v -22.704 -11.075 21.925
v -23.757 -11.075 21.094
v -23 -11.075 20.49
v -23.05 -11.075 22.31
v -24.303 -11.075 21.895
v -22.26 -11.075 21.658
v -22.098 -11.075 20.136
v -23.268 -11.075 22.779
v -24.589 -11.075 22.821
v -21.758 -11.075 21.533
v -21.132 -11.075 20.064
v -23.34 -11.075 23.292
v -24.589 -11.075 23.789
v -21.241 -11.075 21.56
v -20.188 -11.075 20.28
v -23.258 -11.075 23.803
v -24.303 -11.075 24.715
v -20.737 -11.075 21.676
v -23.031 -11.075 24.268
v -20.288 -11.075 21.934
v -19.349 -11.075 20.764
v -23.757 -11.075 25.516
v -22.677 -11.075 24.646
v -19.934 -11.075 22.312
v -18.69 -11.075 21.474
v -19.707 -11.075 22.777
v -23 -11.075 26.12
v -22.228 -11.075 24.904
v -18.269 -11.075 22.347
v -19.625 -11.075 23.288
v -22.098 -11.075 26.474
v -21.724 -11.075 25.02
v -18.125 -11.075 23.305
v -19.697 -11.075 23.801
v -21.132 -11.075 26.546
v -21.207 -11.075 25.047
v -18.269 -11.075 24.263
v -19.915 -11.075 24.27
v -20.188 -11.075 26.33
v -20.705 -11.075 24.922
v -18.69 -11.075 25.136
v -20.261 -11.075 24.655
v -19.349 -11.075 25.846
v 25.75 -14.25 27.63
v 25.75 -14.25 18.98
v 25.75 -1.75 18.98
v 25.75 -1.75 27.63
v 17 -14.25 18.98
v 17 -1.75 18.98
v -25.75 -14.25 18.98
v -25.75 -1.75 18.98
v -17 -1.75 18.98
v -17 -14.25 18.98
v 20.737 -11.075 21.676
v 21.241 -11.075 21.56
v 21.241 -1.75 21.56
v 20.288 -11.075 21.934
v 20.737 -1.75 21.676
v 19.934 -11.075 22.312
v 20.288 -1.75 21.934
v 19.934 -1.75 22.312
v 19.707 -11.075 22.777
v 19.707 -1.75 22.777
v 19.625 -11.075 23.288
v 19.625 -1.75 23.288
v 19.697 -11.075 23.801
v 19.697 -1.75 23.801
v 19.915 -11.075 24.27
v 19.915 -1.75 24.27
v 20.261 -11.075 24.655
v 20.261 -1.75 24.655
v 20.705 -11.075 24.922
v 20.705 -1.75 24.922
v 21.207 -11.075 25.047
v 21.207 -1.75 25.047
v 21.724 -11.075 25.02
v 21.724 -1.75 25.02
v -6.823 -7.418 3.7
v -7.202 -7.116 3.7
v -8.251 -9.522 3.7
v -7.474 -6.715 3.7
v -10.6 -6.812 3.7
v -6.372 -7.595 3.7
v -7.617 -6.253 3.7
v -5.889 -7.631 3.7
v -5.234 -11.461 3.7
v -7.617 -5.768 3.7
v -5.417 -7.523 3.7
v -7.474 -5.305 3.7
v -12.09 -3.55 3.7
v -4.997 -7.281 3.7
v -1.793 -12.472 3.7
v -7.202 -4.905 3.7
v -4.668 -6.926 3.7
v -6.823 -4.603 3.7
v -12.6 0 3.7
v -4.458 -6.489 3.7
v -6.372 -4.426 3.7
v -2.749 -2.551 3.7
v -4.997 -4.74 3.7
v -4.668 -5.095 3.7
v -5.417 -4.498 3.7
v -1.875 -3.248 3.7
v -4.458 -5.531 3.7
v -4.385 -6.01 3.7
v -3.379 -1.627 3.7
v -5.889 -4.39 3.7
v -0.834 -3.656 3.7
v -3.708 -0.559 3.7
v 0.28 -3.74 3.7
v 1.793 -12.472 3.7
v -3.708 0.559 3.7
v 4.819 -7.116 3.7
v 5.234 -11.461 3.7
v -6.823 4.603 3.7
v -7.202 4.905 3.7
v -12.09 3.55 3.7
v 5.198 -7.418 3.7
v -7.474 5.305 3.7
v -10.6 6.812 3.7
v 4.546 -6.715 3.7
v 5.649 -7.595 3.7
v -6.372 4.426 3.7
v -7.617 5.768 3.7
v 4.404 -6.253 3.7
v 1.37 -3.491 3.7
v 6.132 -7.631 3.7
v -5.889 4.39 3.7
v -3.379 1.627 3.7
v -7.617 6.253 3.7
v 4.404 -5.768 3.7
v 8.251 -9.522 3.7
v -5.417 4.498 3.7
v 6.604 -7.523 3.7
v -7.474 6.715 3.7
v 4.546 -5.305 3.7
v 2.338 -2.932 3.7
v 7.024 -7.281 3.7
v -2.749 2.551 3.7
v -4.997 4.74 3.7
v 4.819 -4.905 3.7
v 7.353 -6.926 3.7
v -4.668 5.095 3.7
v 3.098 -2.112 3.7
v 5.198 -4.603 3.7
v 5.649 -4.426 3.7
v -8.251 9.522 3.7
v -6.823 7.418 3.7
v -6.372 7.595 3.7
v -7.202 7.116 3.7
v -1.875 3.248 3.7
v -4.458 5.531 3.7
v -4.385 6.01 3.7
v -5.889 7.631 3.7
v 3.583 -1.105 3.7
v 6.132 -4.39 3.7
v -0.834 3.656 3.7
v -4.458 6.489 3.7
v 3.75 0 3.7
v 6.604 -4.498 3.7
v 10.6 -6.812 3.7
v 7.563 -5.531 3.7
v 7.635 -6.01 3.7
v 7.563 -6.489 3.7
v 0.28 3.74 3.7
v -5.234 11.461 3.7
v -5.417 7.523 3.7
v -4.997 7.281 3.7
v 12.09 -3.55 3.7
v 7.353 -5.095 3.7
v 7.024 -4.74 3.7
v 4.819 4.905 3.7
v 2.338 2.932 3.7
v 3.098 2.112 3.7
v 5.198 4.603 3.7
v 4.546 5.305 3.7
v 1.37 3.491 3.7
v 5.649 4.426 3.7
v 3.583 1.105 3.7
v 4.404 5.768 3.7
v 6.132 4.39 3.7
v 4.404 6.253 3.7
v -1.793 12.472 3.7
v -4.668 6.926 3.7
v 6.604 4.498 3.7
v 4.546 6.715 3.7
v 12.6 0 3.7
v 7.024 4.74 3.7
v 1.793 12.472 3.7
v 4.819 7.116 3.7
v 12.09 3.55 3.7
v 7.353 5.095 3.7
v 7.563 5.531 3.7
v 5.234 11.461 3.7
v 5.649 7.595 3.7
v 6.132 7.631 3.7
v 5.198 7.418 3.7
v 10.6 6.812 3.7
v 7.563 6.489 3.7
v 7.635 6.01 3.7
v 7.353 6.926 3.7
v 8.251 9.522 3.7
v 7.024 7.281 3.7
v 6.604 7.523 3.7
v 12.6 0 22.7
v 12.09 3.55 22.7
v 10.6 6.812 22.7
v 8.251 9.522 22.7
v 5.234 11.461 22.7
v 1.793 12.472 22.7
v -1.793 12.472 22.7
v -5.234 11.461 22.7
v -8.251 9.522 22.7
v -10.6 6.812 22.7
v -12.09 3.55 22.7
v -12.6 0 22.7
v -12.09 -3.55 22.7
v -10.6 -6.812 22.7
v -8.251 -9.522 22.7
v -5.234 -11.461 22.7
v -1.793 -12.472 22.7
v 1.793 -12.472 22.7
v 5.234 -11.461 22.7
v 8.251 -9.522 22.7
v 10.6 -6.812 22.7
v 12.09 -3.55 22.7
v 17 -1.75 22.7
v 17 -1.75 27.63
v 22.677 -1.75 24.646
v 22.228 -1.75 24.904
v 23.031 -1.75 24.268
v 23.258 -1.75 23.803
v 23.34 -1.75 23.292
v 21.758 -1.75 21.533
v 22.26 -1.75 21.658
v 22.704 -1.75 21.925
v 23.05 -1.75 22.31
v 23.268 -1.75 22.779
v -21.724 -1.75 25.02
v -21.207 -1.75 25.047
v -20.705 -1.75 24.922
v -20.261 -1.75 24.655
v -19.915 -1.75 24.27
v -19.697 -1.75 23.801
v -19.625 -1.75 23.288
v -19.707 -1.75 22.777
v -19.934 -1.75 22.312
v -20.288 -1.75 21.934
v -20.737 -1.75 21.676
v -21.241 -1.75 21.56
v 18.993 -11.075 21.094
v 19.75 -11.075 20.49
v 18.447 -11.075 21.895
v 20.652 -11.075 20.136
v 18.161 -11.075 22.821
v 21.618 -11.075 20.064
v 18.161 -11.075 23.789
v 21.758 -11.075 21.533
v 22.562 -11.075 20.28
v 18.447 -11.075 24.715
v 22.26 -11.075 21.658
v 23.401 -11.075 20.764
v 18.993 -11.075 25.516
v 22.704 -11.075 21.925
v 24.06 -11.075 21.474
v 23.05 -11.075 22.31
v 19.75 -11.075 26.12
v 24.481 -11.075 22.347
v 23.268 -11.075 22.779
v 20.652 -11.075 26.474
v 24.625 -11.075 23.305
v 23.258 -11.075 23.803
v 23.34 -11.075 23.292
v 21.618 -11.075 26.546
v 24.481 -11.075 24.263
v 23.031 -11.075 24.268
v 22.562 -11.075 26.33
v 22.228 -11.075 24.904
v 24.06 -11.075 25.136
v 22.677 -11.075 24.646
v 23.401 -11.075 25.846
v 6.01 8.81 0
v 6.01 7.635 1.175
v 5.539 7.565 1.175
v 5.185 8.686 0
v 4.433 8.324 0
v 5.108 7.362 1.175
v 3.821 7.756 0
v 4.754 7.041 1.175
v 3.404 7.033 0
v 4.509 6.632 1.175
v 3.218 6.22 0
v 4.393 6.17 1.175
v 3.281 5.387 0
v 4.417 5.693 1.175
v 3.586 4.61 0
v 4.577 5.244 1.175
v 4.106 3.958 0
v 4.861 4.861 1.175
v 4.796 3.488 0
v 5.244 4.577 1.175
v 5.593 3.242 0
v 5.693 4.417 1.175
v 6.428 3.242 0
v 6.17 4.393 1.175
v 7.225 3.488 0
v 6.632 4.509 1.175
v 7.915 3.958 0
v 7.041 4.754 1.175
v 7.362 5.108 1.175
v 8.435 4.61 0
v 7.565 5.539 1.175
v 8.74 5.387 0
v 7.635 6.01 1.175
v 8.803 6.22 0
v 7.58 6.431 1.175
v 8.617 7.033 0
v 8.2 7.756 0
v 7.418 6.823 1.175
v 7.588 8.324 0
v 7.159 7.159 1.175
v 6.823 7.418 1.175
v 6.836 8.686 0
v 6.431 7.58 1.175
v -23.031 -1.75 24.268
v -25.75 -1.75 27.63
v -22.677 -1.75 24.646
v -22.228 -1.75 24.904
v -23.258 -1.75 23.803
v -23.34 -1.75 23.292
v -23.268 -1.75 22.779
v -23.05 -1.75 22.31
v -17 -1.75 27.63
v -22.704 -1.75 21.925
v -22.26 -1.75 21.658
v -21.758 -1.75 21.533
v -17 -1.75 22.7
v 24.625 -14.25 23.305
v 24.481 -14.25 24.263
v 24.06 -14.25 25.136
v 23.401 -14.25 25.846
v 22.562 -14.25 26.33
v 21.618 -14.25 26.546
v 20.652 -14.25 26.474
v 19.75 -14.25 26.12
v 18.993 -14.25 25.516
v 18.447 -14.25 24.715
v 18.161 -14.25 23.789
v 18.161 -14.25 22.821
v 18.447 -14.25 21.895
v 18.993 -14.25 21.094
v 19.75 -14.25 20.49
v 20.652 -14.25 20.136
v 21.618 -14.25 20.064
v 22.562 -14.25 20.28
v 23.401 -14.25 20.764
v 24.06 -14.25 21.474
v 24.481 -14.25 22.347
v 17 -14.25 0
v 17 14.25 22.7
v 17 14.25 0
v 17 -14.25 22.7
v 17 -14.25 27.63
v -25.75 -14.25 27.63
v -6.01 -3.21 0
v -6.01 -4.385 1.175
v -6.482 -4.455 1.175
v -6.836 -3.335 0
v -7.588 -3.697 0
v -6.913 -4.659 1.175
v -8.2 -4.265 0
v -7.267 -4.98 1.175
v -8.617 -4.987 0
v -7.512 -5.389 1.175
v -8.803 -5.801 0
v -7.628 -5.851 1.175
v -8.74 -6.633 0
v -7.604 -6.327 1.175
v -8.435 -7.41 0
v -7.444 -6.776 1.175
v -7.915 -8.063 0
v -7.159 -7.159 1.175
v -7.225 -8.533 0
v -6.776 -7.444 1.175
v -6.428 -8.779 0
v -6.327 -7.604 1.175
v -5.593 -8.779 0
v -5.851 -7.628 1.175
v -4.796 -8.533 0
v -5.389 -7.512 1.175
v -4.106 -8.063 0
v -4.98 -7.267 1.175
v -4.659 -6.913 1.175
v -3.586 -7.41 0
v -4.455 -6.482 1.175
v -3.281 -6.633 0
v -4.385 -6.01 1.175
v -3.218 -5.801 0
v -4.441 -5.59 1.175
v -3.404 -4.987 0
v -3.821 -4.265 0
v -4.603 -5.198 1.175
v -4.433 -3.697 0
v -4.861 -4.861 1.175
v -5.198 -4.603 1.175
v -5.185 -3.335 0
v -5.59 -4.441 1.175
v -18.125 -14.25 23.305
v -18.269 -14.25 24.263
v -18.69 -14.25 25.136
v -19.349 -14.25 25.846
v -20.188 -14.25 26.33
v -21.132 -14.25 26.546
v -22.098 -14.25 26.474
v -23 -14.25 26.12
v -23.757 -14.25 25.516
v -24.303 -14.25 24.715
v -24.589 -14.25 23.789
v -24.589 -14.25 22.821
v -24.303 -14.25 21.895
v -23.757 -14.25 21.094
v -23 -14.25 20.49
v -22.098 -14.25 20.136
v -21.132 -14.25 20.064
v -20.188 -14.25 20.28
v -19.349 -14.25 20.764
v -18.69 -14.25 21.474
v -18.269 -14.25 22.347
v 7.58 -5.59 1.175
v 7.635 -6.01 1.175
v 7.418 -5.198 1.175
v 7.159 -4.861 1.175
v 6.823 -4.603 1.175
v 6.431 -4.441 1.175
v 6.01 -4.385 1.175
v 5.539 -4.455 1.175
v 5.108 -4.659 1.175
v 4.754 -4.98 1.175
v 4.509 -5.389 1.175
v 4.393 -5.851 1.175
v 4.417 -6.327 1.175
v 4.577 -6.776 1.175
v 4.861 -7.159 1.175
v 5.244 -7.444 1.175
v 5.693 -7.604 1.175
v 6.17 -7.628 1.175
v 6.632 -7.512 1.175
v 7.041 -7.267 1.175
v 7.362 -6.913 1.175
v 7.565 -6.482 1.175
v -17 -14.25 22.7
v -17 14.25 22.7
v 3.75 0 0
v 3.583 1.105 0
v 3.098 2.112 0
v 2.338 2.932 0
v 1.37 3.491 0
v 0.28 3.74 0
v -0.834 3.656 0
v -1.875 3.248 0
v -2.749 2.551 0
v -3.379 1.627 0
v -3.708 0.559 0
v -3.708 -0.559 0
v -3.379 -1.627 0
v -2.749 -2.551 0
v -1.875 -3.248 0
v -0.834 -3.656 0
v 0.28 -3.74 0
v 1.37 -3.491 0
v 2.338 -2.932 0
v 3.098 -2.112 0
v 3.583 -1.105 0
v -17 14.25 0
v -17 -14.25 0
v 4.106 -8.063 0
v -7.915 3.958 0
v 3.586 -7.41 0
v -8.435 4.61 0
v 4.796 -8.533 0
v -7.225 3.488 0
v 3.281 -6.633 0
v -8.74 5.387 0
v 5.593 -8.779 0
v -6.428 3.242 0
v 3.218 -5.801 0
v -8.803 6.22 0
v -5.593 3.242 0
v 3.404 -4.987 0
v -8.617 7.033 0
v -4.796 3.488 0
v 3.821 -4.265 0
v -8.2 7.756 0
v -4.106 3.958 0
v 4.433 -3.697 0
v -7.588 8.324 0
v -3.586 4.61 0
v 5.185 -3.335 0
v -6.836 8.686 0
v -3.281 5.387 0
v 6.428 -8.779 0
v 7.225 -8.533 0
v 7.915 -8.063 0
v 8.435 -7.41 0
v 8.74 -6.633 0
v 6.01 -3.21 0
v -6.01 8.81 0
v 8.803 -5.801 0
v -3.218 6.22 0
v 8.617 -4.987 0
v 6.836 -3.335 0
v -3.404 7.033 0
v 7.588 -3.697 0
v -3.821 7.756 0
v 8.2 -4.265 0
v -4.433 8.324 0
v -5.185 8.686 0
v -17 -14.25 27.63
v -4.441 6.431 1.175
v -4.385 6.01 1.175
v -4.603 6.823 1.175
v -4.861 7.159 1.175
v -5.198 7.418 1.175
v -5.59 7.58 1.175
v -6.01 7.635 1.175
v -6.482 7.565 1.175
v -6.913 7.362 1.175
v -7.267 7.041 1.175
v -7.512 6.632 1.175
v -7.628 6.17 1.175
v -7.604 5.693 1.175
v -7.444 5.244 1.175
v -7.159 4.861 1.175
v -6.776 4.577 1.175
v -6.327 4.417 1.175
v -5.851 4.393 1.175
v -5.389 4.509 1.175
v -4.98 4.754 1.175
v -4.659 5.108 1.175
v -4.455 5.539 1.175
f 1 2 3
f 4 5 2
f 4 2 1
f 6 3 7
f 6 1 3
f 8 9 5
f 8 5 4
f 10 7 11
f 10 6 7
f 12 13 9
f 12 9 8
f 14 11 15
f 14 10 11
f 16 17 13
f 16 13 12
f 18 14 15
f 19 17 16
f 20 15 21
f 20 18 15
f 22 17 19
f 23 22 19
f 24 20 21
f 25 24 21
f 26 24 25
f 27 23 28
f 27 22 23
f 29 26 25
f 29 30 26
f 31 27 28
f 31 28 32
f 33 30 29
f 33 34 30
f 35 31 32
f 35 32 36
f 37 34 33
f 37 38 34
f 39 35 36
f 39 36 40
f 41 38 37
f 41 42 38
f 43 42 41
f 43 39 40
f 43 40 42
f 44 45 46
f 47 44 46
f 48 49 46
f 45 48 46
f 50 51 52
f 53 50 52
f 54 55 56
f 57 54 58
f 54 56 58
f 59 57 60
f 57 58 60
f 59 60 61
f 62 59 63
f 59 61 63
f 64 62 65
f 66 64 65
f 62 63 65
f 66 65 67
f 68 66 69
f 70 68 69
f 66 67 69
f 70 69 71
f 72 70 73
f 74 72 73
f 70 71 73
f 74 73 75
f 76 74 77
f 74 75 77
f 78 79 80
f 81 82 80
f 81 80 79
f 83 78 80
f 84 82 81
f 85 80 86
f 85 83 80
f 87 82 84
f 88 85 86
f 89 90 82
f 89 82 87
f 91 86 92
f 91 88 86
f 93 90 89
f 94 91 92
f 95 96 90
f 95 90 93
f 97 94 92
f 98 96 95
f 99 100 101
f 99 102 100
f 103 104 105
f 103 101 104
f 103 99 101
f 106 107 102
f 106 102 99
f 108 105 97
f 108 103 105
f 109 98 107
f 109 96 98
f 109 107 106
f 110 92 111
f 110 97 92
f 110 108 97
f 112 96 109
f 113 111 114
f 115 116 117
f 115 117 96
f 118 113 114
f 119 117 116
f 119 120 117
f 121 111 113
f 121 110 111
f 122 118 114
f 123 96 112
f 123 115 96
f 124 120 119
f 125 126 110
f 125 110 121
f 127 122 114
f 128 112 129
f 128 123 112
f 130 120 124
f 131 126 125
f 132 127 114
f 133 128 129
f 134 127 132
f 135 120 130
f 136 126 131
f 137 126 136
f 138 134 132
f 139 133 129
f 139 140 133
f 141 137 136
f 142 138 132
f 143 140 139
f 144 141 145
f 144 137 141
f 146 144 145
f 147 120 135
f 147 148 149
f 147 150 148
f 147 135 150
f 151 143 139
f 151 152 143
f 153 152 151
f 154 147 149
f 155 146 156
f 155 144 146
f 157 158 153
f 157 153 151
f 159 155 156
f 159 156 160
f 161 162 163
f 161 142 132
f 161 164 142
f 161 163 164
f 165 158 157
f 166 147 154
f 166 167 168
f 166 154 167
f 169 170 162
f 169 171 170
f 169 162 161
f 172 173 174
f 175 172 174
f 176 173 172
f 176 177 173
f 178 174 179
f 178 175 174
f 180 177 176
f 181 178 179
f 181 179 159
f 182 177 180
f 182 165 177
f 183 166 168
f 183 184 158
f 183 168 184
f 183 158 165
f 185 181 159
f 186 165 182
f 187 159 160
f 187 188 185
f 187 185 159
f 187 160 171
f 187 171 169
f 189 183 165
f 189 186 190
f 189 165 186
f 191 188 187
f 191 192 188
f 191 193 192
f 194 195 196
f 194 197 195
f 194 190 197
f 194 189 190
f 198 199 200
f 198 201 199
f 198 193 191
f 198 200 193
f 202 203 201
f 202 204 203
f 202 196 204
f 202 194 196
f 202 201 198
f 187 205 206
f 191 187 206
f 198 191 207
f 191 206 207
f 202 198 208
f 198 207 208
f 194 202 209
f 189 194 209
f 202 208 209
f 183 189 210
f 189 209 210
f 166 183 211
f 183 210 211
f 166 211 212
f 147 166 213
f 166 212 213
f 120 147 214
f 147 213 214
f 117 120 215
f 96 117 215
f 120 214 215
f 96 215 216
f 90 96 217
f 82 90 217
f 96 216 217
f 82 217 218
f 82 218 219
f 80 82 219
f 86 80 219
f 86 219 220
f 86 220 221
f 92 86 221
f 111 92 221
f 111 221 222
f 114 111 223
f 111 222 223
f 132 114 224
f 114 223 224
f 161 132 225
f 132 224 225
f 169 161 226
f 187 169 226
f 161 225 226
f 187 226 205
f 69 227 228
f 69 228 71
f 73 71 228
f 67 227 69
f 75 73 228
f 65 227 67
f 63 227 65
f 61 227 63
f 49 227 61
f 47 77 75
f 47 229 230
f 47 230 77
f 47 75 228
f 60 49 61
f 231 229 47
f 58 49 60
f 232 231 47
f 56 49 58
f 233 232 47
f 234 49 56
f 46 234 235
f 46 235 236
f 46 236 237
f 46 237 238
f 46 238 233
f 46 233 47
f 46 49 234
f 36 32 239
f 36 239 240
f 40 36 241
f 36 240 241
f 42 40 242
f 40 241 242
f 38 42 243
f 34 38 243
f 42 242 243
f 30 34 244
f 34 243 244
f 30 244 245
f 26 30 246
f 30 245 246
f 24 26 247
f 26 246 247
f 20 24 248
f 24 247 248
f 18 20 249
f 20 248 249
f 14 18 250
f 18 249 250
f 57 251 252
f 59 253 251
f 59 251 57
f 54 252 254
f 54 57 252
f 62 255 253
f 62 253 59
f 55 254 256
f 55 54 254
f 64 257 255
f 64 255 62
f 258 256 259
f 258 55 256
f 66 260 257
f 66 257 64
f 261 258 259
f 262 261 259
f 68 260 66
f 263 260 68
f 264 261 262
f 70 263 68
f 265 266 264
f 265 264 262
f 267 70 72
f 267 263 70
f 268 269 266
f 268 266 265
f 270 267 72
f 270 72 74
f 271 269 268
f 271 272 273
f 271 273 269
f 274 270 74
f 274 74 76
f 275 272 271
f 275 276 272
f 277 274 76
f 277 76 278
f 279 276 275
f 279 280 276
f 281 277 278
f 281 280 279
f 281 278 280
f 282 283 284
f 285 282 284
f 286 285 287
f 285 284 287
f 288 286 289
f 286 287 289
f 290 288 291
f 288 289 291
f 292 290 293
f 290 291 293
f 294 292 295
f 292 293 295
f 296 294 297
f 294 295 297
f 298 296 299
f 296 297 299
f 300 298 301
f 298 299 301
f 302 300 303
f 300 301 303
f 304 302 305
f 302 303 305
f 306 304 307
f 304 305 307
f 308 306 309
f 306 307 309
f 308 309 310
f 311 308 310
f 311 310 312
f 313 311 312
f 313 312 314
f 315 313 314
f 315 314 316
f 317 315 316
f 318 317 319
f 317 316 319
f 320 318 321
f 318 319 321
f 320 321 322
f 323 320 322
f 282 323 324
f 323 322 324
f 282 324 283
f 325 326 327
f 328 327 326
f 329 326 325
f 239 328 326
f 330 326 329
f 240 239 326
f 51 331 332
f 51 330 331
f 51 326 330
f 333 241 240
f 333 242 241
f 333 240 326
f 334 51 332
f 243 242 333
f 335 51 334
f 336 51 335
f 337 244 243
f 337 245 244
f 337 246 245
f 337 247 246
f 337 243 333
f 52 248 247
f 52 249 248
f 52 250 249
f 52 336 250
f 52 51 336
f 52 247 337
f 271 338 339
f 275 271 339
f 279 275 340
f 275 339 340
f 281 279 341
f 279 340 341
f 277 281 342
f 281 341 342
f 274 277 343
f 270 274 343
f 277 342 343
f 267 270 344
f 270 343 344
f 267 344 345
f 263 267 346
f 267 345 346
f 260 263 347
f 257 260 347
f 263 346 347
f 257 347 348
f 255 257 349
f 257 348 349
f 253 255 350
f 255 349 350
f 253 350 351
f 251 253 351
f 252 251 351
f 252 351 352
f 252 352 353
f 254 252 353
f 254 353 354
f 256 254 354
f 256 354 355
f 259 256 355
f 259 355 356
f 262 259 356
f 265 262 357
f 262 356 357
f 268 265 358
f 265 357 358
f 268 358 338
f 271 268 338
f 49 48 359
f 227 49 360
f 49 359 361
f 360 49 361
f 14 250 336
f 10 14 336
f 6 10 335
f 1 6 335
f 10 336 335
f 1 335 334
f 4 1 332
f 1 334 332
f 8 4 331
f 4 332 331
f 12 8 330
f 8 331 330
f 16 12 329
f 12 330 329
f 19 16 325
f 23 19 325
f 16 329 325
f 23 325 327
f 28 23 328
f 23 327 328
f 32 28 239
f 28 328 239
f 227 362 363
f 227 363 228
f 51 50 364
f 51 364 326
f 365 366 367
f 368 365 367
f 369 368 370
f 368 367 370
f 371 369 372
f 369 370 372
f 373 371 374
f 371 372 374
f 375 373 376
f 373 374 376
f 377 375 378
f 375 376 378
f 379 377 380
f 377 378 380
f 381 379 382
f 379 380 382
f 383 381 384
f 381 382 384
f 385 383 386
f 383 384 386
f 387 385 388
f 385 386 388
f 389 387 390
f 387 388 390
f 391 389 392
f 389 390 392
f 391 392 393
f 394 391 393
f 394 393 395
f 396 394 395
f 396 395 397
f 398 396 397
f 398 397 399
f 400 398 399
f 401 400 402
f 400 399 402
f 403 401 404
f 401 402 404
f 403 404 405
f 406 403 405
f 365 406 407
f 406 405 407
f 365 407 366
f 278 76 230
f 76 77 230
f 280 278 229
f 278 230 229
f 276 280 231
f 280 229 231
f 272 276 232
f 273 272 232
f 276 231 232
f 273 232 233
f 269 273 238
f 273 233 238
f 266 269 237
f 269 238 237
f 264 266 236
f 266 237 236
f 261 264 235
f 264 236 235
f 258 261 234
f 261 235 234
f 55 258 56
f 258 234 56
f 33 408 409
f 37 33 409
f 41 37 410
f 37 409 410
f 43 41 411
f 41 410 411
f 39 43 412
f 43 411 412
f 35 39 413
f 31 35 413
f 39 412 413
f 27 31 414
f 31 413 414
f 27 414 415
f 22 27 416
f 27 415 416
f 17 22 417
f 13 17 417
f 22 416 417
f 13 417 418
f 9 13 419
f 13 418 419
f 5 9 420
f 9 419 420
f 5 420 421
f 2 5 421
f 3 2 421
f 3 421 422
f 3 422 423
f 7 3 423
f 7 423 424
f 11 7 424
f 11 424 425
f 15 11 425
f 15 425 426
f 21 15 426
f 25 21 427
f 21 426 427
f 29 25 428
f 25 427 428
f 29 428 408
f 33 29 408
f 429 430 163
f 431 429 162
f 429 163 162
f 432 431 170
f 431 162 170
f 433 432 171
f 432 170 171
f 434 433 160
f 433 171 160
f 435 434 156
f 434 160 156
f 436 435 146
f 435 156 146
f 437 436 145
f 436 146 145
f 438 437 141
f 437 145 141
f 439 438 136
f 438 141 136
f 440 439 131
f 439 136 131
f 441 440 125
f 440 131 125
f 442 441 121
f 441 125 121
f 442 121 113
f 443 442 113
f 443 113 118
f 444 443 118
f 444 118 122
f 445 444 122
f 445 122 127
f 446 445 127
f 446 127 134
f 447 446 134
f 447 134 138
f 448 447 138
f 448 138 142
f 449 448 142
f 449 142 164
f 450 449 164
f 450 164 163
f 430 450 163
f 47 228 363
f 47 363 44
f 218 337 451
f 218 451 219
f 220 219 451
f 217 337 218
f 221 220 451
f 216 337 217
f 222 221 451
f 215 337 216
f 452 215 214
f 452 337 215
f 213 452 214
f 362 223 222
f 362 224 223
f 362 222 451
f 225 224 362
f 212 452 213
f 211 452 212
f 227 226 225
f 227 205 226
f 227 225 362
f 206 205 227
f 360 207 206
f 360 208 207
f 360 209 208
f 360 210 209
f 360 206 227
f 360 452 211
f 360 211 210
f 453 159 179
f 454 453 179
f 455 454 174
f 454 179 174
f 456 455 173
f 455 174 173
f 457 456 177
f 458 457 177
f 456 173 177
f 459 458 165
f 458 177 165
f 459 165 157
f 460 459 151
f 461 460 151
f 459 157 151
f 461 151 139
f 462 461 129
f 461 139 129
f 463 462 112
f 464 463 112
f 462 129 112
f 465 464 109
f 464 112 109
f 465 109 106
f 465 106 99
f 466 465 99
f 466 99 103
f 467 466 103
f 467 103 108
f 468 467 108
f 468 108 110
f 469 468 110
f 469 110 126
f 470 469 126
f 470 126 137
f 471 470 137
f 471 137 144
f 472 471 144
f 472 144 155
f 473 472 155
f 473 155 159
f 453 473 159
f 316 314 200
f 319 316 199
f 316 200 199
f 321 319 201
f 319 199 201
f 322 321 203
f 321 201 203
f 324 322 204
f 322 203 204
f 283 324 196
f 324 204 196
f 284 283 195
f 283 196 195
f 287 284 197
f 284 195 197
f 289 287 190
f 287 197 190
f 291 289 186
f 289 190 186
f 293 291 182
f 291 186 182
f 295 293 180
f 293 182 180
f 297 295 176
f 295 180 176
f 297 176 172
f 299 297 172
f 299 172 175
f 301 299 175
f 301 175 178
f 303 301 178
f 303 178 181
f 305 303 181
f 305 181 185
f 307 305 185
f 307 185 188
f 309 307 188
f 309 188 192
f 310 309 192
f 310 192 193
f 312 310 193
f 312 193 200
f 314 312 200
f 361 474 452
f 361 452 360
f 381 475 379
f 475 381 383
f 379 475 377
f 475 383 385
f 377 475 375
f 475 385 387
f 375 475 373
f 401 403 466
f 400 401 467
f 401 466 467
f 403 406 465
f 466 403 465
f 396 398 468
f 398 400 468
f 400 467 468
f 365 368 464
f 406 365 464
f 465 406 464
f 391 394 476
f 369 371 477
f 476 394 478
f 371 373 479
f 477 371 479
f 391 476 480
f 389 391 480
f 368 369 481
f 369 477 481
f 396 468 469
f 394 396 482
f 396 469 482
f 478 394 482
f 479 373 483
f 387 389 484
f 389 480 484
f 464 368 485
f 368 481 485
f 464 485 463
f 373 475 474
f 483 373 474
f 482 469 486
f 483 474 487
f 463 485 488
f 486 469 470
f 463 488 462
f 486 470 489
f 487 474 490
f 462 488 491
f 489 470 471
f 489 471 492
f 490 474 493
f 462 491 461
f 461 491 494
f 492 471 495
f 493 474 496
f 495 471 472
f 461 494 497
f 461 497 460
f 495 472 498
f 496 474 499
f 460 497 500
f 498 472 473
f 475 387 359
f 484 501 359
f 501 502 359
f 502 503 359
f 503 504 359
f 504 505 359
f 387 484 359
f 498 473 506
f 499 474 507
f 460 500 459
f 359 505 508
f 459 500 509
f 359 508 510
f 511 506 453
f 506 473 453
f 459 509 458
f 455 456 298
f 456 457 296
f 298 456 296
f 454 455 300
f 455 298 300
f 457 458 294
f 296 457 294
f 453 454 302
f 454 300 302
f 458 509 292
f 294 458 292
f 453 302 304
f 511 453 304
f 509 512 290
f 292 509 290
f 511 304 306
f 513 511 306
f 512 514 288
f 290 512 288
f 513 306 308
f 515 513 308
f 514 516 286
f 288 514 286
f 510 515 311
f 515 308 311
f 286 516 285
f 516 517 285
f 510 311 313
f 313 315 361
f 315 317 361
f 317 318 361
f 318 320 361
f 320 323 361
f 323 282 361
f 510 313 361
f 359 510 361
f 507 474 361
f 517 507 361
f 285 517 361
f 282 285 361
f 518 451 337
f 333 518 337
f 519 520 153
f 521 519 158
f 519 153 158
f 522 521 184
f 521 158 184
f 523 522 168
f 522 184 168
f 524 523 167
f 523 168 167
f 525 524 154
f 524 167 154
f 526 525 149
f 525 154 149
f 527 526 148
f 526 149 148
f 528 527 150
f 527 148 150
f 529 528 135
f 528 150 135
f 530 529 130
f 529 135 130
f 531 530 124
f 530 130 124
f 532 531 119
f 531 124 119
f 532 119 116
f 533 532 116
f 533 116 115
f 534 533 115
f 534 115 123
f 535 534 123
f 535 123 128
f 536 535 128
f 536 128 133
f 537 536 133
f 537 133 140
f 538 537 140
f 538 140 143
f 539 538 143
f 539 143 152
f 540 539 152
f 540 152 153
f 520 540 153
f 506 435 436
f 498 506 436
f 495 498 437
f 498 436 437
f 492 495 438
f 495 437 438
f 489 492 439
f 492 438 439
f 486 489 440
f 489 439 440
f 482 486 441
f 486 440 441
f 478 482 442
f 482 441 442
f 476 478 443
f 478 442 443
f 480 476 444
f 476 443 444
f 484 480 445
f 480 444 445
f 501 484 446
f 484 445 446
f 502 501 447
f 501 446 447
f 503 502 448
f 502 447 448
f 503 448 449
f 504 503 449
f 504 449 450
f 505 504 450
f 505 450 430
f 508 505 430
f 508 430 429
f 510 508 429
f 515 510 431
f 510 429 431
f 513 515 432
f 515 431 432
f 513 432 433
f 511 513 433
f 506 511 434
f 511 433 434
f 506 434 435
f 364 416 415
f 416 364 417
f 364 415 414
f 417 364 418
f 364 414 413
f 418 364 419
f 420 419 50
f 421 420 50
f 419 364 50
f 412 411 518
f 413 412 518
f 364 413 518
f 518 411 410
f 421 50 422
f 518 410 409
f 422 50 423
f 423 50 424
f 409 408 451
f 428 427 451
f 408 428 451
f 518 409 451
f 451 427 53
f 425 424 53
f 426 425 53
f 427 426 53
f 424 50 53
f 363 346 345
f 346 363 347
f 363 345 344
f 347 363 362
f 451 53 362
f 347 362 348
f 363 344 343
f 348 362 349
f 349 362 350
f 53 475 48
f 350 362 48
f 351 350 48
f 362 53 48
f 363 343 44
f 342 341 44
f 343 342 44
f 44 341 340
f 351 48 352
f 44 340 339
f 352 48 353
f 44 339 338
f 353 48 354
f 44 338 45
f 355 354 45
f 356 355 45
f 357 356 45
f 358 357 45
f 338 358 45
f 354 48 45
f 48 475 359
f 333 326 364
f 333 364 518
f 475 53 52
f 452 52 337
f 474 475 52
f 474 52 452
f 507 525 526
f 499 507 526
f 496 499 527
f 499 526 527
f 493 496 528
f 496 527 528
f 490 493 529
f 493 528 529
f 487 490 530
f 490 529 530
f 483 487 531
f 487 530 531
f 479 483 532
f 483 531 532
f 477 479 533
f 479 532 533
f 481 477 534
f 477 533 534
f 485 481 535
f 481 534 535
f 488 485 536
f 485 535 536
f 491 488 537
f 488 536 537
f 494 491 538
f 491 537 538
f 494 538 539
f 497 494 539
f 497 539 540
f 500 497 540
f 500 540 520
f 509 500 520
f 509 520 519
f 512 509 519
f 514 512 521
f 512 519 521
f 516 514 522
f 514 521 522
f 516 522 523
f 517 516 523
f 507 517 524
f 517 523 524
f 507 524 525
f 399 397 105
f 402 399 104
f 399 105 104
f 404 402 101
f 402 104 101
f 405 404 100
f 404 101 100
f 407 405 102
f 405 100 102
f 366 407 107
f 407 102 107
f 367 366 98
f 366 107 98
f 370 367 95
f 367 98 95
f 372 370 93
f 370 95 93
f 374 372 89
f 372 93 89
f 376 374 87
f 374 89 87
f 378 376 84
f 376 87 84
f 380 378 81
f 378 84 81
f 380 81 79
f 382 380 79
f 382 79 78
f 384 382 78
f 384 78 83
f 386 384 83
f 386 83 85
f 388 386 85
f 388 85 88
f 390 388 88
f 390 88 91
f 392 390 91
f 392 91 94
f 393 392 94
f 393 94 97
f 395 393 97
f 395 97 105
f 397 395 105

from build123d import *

# Parameters (mm, degrees)
SKETCH1_W                = 34
SKETCH1_H                = 28.5
BOSS_EXTRUDE1_DEPTH      = 22.7
SKETCH3_R                = 12.6
CUT_EXTRUDE1_DEPTH       = 19
SKETCH5_R                = 1.625
SKETCH5_R_2              = 3.75
CUT_EXTRUDE2_DEPTH       = 30.207233693
BOSS_EXTRUDE2_DEPTH      = 4.93
BOSS_EXTRUDE2_DEPTH_BACK = 3.72
SKETCH7_W                = 8.75
SKETCH7_H                = 12.5
SKETCH8_R                = 1.75
CUT_EXTRUDE3_DEPTH       = 42.018037496
SKETCH9_R                = 3.25
CUT_EXTRUDE4_DEPTH       = 3.175
SKETCH14_R               = 1.75
CUT_EXTRUDE8_DEPTH       = 50


with BuildPart() as part:
    # Sketch1 → Boss-Extrude1 (new body)
    with BuildSketch(Plane.XY):
        Rectangle(SKETCH1_W, SKETCH1_H)
    extrude(amount=BOSS_EXTRUDE1_DEPTH)

    # Sketch3 → Cut-Extrude1 (cut)
    with BuildSketch(Plane.XY.offset(22.7)):
        Circle(SKETCH3_R)
    extrude(amount=-CUT_EXTRUDE1_DEPTH, mode=Mode.SUBTRACT)

    # Sketch5 → Cut-Extrude2 (cut, through all)
    with BuildSketch(Plane.XY.offset(3.7)):
        with Locations((6.01040764, 6.01040764)):
            Circle(SKETCH5_R)
        with Locations((-6.01040764, 6.01040764)):
            Circle(SKETCH5_R)
        with Locations((6.01040764, -6.01040764)):
            Circle(SKETCH5_R)
        with Locations((-6.01040764, -6.01040764)):
            Circle(SKETCH5_R)
        Circle(SKETCH5_R_2)
    extrude(amount=-CUT_EXTRUDE2_DEPTH, mode=Mode.SUBTRACT)

    # Sketch7 → Boss-Extrude2 (add, two sides: drawn at the far end of the back side and taken through both)
    with BuildSketch(Plane.XY.offset(22.7).offset(-BOSS_EXTRUDE2_DEPTH_BACK)):
        with Locations((-21.375, -8)):
            Rectangle(SKETCH7_W, SKETCH7_H)
        with Locations((21.375, -8)):
            Rectangle(SKETCH7_W, SKETCH7_H)
    extrude(amount=BOSS_EXTRUDE2_DEPTH + BOSS_EXTRUDE2_DEPTH_BACK)

    # Sketch8 → Cut-Extrude3 (cut, through all)
    with BuildSketch(Plane(origin=(0, -1.75, 0), x_dir=(1, 0, 0), z_dir=(0, 1, 0))):
        with Locations(Location((21.375, -23.305, 0), (0, 0, 180))):
            Circle(SKETCH8_R)
        with Locations(Location((-21.375, -23.305, 0), (0, 0, 180))):
            Circle(SKETCH8_R)
    extrude(amount=-CUT_EXTRUDE3_DEPTH, mode=Mode.SUBTRACT)

    # Sketch9 → Cut-Extrude4 (cut)
    with BuildSketch(Plane.XZ.offset(14.25)):
        with Locations((-21.375, 23.305)):
            Circle(SKETCH9_R)
        with Locations((21.375, 23.305)):
            Circle(SKETCH9_R)
    extrude(amount=-CUT_EXTRUDE4_DEPTH, mode=Mode.SUBTRACT)

    # Cut-Extrude5 cone 1 section (through the dimple's axis) → Cut-Extrude5 (revolve, cut)
    with BuildSketch(Plane(origin=(-6.01040764, 6.01040764, 0), x_dir=(0, 1, 0), z_dir=(1, 0, 0))):
        Polygon((0, 0), (2.8, 0), (0, 2.8), align=None)
    revolve(axis=Axis((-6.01040764, 6.01040764, 0), (0, 0, 1)), mode=Mode.SUBTRACT)

    # Cut-Extrude5 cone 2 section (through the dimple's axis) → Cut-Extrude5 cone 2 (revolve, cut)
    with BuildSketch(Plane(origin=(-6.01040764, -6.01040764, 0), x_dir=(0, 1, 0), z_dir=(1, 0, 0))):
        Polygon((0, 0), (2.8, 0), (0, 2.8), align=None)
    revolve(axis=Axis((-6.01040764, -6.01040764, 0), (0, 0, 1)), mode=Mode.SUBTRACT)

    # Cut-Extrude5 cone 3 section (through the dimple's axis) → Cut-Extrude5 cone 3 (revolve, cut)
    with BuildSketch(Plane(origin=(6.01040764, -6.01040764, 0), x_dir=(0, 1, 0), z_dir=(1, 0, 0))):
        Polygon((0, 0), (2.8, 0), (0, 2.8), align=None)
    revolve(axis=Axis((6.01040764, -6.01040764, 0), (0, 0, 1)), mode=Mode.SUBTRACT)

    # Cut-Extrude5 cone 4 section (through the dimple's axis) → Cut-Extrude5 cone 4 (revolve, cut)
    with BuildSketch(Plane(origin=(6.01040764, 6.01040764, 0), x_dir=(0, 1, 0), z_dir=(1, 0, 0))):
        Polygon((0, 0), (2.8, 0), (0, 2.8), align=None)
    revolve(axis=Axis((6.01040764, 6.01040764, 0), (0, 0, 1)), mode=Mode.SUBTRACT)

    # Sketch14 → Cut-Extrude8 (cut)
    with BuildSketch(Plane(origin=(132.323959999, 1.25, 25.756345109), x_dir=(1, 0, 0), z_dir=(0, 1, 0))):
        with Locations((-110.733959999, 2.481345109)):
            Circle(SKETCH14_R)
        with Locations((-153.913959999, 2.481345109)):
            Circle(SKETCH14_R)
    extrude(amount=-CUT_EXTRUDE8_DEPTH, mode=Mode.SUBTRACT)


solid = part.part
